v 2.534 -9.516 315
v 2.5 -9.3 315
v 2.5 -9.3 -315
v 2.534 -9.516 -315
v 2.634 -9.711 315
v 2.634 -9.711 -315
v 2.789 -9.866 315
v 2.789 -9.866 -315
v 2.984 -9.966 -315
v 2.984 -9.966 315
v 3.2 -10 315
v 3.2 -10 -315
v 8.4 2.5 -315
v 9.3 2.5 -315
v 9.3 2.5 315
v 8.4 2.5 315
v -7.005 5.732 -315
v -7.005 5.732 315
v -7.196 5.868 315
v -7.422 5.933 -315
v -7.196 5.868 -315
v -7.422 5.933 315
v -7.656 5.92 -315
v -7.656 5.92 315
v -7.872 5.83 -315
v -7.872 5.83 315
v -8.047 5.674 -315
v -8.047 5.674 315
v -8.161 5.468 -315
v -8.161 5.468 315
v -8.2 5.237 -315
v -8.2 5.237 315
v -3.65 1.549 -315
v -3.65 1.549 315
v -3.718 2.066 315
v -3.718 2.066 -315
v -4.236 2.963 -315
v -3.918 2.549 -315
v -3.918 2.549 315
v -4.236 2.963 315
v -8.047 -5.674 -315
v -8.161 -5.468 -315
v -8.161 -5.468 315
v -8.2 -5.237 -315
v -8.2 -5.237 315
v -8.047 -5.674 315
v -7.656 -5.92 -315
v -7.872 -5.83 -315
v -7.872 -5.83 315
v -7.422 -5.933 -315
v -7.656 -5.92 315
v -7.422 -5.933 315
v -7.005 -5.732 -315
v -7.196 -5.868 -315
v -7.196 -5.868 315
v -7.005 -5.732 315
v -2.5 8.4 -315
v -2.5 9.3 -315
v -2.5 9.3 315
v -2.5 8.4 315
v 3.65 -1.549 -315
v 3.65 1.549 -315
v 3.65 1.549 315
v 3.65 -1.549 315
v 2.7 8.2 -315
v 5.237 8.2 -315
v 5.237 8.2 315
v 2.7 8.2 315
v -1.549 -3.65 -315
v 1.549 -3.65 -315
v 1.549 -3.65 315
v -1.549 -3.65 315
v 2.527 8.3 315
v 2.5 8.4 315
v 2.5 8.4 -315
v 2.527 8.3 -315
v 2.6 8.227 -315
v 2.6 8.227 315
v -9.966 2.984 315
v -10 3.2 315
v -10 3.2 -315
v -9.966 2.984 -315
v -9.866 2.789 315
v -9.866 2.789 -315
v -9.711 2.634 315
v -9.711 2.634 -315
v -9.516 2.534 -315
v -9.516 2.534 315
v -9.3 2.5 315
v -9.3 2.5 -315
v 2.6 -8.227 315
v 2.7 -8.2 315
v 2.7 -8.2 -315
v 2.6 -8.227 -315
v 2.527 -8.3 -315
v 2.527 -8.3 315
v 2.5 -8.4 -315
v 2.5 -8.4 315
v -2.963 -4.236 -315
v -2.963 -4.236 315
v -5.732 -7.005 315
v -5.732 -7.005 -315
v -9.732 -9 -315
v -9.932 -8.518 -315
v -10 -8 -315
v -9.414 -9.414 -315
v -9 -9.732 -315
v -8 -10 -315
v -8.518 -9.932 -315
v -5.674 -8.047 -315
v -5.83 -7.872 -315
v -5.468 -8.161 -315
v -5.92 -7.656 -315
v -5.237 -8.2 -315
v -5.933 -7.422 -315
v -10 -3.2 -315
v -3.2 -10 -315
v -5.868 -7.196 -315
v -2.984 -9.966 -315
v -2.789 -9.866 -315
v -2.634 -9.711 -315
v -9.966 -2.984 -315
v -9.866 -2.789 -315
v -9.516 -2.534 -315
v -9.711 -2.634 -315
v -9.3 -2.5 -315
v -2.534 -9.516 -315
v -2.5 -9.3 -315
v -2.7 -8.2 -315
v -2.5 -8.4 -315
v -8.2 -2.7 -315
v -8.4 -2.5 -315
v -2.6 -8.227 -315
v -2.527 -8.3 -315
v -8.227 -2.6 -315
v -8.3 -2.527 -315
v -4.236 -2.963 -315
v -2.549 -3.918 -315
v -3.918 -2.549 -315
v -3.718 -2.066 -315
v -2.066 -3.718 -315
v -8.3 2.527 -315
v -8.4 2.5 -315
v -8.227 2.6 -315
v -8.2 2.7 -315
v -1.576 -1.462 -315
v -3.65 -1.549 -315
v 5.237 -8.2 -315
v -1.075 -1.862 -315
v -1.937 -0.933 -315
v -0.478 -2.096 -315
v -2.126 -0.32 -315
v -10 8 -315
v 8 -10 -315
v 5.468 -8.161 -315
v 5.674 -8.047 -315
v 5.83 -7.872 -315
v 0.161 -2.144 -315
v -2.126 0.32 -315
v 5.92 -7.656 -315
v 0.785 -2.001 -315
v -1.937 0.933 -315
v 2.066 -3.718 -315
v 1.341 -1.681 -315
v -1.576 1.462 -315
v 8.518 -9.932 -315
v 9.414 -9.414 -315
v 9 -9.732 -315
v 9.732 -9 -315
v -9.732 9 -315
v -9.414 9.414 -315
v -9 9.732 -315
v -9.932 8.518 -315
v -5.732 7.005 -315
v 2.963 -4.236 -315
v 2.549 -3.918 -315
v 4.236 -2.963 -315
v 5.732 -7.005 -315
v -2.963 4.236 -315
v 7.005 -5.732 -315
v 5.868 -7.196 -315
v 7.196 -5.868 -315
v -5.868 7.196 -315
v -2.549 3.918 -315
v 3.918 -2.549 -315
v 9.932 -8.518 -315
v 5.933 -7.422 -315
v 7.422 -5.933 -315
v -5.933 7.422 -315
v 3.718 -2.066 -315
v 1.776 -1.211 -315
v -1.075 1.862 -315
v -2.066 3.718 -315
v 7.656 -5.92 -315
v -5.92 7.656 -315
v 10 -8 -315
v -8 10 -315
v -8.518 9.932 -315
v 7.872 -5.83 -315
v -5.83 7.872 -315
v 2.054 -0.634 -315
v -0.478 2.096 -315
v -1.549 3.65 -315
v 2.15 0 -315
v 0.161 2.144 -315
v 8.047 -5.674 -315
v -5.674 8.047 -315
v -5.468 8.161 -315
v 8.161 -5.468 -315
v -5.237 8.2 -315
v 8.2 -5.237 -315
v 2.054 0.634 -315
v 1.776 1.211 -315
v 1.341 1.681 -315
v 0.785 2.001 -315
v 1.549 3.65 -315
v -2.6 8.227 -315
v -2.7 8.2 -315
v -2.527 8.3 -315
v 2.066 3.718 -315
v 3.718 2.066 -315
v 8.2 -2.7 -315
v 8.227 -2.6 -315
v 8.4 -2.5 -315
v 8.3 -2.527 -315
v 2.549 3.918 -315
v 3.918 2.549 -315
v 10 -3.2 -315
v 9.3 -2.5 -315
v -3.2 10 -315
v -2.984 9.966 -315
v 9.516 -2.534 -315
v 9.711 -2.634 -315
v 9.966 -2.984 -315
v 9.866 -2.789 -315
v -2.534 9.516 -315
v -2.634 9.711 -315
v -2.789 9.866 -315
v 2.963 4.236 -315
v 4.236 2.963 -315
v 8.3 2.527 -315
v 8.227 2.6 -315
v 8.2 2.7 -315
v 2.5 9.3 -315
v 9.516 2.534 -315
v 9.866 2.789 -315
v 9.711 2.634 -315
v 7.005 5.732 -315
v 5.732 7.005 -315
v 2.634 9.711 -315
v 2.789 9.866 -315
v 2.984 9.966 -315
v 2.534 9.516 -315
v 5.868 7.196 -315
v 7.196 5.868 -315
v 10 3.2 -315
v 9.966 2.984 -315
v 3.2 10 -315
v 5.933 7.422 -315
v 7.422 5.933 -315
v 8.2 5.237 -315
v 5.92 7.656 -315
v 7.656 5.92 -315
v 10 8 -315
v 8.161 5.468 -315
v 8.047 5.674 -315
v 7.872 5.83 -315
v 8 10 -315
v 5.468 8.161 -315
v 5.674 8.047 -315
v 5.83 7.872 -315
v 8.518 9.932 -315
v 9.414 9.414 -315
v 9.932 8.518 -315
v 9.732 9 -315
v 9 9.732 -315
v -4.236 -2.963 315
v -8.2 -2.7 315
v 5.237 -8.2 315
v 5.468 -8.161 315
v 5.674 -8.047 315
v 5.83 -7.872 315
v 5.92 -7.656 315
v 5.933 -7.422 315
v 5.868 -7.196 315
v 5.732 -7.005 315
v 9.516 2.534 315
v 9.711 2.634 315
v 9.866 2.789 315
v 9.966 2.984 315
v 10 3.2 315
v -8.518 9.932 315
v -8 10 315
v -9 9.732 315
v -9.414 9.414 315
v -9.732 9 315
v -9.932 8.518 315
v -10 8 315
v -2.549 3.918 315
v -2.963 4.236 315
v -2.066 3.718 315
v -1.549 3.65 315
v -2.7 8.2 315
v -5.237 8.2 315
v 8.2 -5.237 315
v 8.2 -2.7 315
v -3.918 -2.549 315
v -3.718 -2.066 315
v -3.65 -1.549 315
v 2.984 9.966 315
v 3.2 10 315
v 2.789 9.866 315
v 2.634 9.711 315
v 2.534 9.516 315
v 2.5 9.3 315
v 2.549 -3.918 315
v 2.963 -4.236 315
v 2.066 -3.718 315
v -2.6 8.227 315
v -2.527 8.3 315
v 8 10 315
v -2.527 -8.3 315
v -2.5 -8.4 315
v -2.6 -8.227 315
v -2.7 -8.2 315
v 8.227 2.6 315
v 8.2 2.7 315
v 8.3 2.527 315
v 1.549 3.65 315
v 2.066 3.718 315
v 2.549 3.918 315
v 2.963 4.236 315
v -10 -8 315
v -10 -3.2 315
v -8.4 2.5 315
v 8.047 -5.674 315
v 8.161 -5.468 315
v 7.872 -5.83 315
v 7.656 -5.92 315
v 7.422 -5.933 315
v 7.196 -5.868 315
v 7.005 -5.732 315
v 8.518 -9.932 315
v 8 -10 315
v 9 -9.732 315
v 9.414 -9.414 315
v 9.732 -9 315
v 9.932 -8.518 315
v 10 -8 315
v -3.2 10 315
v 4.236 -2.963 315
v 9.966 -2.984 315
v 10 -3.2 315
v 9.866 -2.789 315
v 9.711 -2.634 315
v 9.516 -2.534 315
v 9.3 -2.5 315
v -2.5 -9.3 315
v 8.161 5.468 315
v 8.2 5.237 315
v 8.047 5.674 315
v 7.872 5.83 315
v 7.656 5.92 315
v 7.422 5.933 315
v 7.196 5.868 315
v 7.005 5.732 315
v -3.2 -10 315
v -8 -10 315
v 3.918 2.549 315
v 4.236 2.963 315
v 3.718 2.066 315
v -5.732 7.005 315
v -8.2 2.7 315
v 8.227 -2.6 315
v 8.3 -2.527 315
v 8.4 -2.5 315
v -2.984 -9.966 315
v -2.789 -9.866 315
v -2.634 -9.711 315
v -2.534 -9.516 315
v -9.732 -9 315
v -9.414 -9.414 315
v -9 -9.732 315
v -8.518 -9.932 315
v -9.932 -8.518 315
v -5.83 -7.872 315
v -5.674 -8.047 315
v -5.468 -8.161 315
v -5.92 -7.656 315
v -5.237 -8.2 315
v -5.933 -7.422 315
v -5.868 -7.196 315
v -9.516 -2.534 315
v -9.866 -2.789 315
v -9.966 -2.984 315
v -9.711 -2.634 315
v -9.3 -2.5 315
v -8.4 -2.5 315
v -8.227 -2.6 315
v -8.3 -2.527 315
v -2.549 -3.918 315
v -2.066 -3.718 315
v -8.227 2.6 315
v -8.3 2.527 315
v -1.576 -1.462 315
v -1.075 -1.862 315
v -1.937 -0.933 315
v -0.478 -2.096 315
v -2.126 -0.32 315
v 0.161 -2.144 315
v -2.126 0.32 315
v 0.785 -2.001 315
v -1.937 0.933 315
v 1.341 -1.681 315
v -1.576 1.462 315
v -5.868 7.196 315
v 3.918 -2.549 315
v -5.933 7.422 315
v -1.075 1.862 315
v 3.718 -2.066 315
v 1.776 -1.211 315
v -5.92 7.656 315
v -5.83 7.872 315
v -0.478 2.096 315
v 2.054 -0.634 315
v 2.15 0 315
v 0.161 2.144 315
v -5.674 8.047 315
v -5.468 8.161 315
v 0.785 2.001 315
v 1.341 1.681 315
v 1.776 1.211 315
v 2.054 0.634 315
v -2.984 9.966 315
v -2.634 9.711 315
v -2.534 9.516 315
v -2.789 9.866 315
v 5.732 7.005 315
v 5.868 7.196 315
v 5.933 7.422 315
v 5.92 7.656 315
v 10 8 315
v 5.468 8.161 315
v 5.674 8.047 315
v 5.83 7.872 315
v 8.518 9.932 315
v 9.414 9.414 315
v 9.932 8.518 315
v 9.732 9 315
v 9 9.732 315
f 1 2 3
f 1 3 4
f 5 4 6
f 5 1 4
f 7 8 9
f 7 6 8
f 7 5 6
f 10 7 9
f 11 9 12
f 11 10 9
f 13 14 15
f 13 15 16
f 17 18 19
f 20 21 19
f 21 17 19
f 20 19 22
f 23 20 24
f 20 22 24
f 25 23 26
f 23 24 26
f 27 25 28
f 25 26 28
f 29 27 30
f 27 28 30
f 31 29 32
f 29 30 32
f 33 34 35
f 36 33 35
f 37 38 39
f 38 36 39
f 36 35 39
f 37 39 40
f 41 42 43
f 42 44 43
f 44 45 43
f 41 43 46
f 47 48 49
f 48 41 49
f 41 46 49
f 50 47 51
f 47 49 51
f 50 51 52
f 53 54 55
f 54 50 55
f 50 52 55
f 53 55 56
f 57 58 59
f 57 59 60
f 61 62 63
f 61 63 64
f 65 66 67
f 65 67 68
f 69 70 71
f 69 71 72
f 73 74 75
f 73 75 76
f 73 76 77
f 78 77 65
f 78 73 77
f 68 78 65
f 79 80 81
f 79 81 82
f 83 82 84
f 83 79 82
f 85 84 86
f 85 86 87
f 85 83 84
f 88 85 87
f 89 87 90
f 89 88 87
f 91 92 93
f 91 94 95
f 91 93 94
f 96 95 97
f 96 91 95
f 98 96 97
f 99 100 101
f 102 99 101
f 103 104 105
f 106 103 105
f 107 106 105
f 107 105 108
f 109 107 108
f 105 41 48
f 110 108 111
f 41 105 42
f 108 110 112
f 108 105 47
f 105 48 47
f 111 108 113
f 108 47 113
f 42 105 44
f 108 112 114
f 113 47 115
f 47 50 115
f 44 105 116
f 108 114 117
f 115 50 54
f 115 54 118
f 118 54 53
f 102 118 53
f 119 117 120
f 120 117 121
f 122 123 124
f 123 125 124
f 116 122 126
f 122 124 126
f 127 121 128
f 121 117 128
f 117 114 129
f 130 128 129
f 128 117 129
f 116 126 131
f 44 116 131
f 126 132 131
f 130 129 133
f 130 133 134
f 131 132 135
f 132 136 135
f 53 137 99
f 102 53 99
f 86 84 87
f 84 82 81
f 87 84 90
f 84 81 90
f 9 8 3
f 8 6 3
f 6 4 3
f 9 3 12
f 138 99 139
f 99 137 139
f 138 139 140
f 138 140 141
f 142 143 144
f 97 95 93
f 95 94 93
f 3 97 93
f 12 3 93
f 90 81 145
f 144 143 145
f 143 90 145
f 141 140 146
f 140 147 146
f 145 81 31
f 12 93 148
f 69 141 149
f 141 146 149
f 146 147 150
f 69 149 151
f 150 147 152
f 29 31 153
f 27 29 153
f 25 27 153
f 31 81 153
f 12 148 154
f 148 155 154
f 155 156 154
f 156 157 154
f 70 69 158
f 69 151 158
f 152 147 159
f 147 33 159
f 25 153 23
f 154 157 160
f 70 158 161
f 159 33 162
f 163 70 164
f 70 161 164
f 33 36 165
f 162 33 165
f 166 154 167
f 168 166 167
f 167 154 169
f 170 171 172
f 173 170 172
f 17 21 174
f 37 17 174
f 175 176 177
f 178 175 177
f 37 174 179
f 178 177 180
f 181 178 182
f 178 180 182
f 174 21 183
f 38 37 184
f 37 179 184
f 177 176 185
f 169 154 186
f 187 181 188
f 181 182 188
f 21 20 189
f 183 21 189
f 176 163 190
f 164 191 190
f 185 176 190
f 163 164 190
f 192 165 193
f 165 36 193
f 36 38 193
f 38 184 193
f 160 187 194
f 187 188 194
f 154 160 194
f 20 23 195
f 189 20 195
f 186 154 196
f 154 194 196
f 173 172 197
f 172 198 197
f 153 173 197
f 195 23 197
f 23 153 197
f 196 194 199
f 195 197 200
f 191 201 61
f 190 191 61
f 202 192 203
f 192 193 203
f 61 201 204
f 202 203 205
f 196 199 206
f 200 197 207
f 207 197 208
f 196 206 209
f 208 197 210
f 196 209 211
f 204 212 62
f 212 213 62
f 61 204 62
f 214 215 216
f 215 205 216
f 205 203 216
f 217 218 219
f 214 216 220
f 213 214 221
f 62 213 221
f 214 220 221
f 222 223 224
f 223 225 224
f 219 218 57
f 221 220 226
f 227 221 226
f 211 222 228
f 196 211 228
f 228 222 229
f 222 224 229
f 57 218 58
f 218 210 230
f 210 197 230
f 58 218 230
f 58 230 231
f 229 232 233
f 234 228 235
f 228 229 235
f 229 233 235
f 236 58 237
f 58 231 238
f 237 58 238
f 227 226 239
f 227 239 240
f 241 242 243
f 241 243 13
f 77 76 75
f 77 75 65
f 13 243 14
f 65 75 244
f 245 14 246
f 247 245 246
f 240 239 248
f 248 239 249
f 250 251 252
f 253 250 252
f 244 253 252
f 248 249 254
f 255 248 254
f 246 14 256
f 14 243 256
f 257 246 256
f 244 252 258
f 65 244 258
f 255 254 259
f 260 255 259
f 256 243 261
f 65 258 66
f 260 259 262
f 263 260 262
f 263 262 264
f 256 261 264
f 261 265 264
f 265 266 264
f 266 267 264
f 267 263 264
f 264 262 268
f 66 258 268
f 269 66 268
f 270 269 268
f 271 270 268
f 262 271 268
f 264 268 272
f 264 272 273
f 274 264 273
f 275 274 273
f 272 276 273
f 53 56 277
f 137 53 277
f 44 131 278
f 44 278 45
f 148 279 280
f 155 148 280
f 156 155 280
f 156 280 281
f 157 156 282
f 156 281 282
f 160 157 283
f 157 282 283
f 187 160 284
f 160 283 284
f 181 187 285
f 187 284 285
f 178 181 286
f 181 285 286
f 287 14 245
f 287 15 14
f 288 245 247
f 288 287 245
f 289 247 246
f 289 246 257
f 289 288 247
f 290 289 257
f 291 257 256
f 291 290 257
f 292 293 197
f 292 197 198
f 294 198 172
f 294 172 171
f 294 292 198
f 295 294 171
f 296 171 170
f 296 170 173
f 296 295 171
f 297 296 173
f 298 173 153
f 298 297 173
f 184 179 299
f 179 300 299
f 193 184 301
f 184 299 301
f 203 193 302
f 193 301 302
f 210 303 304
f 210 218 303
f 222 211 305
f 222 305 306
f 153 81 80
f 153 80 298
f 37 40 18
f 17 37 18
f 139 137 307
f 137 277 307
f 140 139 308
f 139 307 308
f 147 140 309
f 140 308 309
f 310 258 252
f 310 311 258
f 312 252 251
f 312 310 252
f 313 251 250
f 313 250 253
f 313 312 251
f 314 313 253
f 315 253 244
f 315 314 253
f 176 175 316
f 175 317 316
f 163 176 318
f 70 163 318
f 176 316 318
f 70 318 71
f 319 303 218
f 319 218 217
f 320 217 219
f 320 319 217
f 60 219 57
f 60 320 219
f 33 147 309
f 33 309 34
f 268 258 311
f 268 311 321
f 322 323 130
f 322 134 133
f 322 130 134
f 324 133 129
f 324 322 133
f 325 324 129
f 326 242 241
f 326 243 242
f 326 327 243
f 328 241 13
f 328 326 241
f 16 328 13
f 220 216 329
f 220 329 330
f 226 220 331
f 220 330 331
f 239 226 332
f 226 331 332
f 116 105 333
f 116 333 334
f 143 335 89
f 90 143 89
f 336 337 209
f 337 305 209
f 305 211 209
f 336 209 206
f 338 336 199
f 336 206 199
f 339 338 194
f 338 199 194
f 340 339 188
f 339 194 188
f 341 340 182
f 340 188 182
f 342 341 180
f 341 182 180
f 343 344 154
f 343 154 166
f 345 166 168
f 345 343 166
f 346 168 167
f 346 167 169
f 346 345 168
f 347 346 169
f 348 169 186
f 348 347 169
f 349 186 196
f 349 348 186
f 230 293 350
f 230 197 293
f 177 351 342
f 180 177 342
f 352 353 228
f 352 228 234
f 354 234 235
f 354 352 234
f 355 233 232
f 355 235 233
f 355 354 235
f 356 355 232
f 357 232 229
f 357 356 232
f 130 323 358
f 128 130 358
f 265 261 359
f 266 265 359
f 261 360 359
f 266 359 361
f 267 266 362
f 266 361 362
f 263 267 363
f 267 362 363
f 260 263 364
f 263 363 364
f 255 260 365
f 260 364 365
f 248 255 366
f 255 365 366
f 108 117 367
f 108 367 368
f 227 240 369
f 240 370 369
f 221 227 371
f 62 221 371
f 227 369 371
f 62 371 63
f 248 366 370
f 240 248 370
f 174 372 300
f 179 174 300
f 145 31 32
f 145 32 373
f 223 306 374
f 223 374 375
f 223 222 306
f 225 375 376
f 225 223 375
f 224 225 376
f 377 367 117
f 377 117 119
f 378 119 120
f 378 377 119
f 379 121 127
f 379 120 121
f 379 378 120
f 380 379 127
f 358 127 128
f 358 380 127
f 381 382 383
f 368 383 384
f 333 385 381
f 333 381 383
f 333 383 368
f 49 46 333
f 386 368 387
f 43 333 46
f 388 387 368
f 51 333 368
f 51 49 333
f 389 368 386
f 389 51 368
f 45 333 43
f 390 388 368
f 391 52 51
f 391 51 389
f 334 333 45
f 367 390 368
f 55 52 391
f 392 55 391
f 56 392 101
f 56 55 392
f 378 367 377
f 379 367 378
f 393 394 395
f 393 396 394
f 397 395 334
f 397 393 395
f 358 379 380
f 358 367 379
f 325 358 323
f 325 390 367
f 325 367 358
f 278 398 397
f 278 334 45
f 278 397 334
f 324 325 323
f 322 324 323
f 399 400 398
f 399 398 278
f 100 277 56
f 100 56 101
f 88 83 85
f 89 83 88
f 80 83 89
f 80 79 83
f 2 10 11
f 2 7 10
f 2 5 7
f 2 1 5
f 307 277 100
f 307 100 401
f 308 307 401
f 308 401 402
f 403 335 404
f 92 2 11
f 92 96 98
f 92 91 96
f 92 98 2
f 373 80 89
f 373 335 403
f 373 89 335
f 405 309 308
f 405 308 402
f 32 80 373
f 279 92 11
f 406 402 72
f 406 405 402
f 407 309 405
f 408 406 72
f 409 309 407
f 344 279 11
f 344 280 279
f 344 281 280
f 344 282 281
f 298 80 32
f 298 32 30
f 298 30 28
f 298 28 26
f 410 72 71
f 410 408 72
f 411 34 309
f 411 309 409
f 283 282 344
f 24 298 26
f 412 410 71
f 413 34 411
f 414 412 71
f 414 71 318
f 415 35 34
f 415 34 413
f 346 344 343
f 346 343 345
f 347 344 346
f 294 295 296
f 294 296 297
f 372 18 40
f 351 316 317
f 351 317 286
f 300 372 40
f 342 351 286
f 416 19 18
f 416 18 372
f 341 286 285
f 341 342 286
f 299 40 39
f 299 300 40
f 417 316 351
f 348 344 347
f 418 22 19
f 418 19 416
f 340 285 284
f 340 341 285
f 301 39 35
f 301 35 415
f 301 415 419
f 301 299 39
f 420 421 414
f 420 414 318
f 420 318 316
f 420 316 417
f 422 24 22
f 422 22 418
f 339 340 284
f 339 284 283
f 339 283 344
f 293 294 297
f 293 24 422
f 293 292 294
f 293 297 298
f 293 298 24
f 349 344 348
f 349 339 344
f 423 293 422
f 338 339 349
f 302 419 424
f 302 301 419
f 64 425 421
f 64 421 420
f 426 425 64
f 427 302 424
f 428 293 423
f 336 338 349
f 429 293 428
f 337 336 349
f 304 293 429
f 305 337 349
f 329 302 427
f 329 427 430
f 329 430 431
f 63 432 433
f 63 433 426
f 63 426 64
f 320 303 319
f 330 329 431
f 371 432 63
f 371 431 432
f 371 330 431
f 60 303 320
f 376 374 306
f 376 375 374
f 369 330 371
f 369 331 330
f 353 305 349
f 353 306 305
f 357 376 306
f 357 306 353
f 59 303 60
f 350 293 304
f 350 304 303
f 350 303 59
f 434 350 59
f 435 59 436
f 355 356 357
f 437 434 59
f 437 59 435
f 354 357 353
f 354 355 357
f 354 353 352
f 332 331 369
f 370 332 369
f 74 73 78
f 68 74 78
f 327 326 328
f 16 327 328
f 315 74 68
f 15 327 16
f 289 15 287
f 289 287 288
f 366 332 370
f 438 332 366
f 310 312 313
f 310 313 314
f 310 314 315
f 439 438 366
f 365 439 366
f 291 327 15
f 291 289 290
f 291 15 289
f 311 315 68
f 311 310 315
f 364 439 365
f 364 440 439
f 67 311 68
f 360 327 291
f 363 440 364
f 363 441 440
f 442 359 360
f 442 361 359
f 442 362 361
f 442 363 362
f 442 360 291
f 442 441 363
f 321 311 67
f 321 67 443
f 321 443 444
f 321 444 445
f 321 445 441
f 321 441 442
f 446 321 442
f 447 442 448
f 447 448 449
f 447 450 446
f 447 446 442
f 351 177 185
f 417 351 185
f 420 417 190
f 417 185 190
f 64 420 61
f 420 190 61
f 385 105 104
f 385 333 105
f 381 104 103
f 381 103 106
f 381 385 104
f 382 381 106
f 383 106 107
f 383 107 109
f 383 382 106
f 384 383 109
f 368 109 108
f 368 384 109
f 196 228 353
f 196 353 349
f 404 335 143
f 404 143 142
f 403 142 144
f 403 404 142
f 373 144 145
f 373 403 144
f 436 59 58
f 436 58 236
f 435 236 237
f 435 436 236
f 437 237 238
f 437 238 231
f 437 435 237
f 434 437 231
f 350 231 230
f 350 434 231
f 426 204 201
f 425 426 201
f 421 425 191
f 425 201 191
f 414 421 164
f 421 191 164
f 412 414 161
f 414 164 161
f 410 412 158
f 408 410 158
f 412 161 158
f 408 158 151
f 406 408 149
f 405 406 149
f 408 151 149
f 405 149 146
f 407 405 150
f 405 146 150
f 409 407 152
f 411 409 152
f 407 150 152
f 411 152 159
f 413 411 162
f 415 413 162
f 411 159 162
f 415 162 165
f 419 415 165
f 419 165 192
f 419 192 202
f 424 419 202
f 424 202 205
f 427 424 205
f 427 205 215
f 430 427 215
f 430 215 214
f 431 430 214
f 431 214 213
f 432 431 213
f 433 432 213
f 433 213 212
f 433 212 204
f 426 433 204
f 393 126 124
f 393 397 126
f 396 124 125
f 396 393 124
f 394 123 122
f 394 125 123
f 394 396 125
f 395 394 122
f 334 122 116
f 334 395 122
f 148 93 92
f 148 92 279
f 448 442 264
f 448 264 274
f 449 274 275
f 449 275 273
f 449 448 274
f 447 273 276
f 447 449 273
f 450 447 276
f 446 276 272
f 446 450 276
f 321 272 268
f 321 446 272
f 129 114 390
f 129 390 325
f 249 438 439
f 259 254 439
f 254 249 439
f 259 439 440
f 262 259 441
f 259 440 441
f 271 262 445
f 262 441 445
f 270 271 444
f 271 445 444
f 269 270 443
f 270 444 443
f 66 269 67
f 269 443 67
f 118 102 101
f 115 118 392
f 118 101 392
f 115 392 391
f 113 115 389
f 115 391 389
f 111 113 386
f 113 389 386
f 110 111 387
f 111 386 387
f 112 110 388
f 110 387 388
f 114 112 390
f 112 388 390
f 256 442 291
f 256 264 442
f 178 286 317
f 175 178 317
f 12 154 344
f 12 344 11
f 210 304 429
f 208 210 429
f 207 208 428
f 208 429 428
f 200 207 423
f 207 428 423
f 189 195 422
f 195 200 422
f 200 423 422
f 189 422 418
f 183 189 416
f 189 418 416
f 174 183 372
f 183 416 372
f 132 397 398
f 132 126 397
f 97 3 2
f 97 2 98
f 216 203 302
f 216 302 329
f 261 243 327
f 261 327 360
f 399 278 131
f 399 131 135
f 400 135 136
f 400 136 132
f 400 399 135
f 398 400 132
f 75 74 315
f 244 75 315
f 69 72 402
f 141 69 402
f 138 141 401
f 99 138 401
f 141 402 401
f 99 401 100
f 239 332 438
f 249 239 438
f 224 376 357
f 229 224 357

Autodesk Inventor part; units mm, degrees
ref_plane "YZ Plane" through (0, 0, 0) normal (1, 0, 0) x (0, 1, 0)
ref_plane "XZ Plane" through (0, 0, 0) normal (0, 1, 0) x (-1, 0, 0)
ref_plane "XY Plane" through (0, 0, 0) normal (0, 0, 1) x (1, 0, 0)
sketch "Sketch1" plane through (0, 0, 0) normal (0, 0, 1) x (1, 0, 0)
  circle A0 centre (0, 0) radius 2.15
  line L0 (-10, 10) -> (-2.5, 10)
  line L1 (-2.5, 10) -> (-2.5, 8.2)
  line L2 (-2.5, 8.2) -> (-6.9272, 8.2)
  line L3 (-6.9272, 8.2) -> (-2.3772, 3.65)
  line L4 (-2.3772, 3.65) -> (2.3772, 3.65)
  line L5 (2.3772, 3.65) -> (6.9272, 8.2)
  line L6 (6.9272, 8.2) -> (2.5, 8.2)
  line L7 (2.5, 8.2) -> (2.5, 10)
  line L8 (2.5, 10) -> (10, 10)
  line L9 (10, 10) -> (10, 2.5)
  line L10 (10, 2.5) -> (8.2, 2.5)
  line L11 (8.2, 2.5) -> (8.2, 6.9272)
  line L12 (8.2, 6.9272) -> (3.65, 2.3772)
  line L13 (3.65, 2.3772) -> (3.65, -2.3772)
  line L14 (3.65, -2.3772) -> (8.2, -6.9272)
  line L15 (8.2, -6.9272) -> (8.2, -2.5)
  line L16 (8.2, -2.5) -> (10, -2.5)
  line L17 (10, -2.5) -> (10, -10)
  line L18 (10, -10) -> (2.5, -10)
  line L19 (2.5, -10) -> (2.5, -8.2)
  line L20 (2.5, -8.2) -> (6.9272, -8.2)
  line L21 (6.9272, -8.2) -> (2.3772, -3.65)
  line L22 (2.3772, -3.65) -> (-2.3772, -3.65)
  line L23 (-2.3772, -3.65) -> (-6.9272, -8.2)
  line L24 (-6.9272, -8.2) -> (-2.5, -8.2)
  line L25 (-2.5, -8.2) -> (-2.5, -10)
  line L26 (-2.5, -10) -> (-10, -10)
  line L27 (-10, -10) -> (-10, -2.5)
  line L28 (-10, -2.5) -> (-8.2, -2.5)
  line L29 (-8.2, -2.5) -> (-8.2, -6.9272)
  line L30 (-8.2, -6.9272) -> (-3.65, -2.3772)
  line L31 (-3.65, -2.3772) -> (-3.65, 2.3772)
  line L32 (-3.65, 2.3772) -> (-8.2, 6.9272)
  line L33 (-8.2, 6.9272) -> (-8.2, 2.5)
  line L34 (-8.2, 2.5) -> (-10, 2.5)
  line L35 (-10, 2.5) -> (-10, 10)
  line L36 (0, 0) -> (-30.8654, 30.8654)
  line L37 (0, 0) -> (30.8654, 30.8654)
  line L38 (0, 0) -> (42.5392, 0)
  line L39 (0, 0) -> (0, 44.3419)
  dimension "d0" = 45
  dimension "d1" = 90
  dimension "Breite" = 20
  dimension "Tiefe_Schiene" = 6.35
  dimension "d2" = 1.8
  dimension "Durchmesser_Loch" = 4.3
  dimension "Wandstaerke" = 1.8
  dimension "d3" = 1.8
  dimension "Breite_Schiene" = 5
  dimension "d4" = 5
extrude "Extrusion1" add sketch "Sketch1" along normal mid plane 630 contours L38 L13 L14 L15 L16 L17 L18 L19 L20 L21 L22 L23 L24 L25 L26 L27 L28 L29 L30 L31 L32 L33 L34 L35 L36 A0 | A0 L37 L9 L10 L11 L12 L13 L38 | A0 L39 L4 L5 L6 L7 L8 L37 | L36 L0 L1 L2 L3 L4 L39 A0
fillet "Fillet1" radius 2 4 edges at (10, 10, 0) (-10, 10, 0) (10, -10, 0) (-10, -10, 0)
fillet "Fillet2" radius 0.2 8 edges at (-2.5, 8.2, 0) (2.5, 8.2, 0) (8.2, 2.5, 0) (8.2, -2.5, 0) (-2.5, -8.2, 0) (-8.2, -2.5, 0) (-8.2, 2.5, 0) (2.5, -8.2, 0)
fillet "Fillet3" radius 0.7 16 edges at (-2.5, 10, 0) (2.5, 10, 0) (10, 2.5, 0) (10, -2.5, 0) (2.5, -10, 0) (-2.5, -10, 0) (-10, -2.5, 0) (-10, 2.5, 0) (-6.9272, -8.2, 0) (-8.2, -6.9272, 0) (6.9272, -8.2, 0) (8.2, -6.9272, 0) (8.2, 6.9272, 0) (6.9272, 8.2, 0) (-6.9272, 8.2, 0) (-8.2, 6.9272, 0)
fillet "Fillet4" radius 2 8 edges at (-3.65, 2.3772, 0) (-2.3772, 3.65, 0) (2.3772, 3.65, 0) (3.65, 2.3772, 0) (3.65, -2.3772, 0) (2.3772, -3.65, 0) (-2.3772, -3.65, 0) (-3.65, -2.3772, 0)
equation "\"d2\" = Wandstaerke"
equation "\"d3\" = Wandstaerke"
equation "\"d4\" = Breite_Schiene"
properties part number "ITEM_20x20_630mm"
